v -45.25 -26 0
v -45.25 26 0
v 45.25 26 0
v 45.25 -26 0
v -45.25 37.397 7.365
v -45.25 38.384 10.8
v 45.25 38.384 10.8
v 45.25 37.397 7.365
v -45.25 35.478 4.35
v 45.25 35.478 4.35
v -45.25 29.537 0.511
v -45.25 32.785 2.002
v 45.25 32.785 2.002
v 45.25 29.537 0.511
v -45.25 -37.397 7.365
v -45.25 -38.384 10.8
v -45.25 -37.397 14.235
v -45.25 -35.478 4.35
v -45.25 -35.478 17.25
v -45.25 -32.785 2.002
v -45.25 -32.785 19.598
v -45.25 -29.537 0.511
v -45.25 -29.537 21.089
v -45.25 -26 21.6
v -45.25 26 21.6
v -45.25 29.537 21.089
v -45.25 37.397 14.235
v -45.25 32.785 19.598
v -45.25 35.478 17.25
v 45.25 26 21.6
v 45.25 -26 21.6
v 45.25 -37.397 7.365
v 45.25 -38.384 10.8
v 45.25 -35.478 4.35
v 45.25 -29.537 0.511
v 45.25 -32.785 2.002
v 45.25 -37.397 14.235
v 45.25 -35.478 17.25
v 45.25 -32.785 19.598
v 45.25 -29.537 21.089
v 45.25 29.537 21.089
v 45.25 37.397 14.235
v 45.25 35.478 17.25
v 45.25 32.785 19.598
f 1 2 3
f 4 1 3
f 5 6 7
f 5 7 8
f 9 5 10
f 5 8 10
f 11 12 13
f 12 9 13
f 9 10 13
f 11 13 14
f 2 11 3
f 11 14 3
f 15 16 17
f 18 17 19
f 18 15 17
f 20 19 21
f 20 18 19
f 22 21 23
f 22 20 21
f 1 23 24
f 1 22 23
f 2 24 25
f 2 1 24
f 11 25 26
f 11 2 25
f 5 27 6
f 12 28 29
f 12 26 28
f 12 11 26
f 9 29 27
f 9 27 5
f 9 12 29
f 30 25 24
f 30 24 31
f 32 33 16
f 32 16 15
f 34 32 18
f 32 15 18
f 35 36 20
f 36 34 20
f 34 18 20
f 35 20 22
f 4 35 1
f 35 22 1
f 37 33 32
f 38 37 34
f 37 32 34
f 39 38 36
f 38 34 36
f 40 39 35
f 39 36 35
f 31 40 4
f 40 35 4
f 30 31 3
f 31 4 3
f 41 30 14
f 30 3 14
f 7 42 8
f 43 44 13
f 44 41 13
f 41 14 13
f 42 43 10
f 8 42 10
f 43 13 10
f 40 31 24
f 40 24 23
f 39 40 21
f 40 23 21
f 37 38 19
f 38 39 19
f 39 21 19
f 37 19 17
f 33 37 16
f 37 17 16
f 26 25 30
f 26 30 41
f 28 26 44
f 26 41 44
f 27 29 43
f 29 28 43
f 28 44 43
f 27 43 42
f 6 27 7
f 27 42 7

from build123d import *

# Parameters (mm, degrees)
SKETCH_1_W      = 90.5
SKETCH_1_H      = 77
EXTRUDE_1_DEPTH = 21.6
FILLET_1_R      = 12.5


with BuildPart() as part:
    # 草圖1 → 填料-伸長1 (new body)
    with BuildSketch(Plane.XY):
        Rectangle(SKETCH_1_W, SKETCH_1_H)
    extrude(amount=EXTRUDE_1_DEPTH)

    # 圓角1
    # the kernel refuses this fillet: 12.5 mm, written as the material it takes off along each edge
    with BuildSketch(Plane(origin=(-76.5, -38.5, 0), x_dir=(0, 0, 1), z_dir=(1, 0, 0)), Plane(origin=(76.5, 38.5, 0), x_dir=(0, 0, 1), z_dir=(-1, 0, 0))) as fillet_1_piece_1:
        with BuildLine():
            CenterArc((FILLET_1_R, -FILLET_1_R), FILLET_1_R, 90, 90)
            Line((0, -FILLET_1_R), (0, 0))
            Line((0, 0), (FILLET_1_R, 0))
        make_face()
    extrude(amount=153, mode=Mode.SUBTRACT)
    with BuildSketch(Plane(origin=(-76.5, -38.5, 21.6), x_dir=(0, 0, -1), z_dir=(1, 0, 0)), Plane(origin=(76.5, 38.5, 21.6), x_dir=(0, 0, -1), z_dir=(-1, 0, 0))) as fillet_1_piece_2:
        with BuildLine():
            CenterArc((FILLET_1_R, FILLET_1_R), FILLET_1_R, 180, 90)
            Line((0, FILLET_1_R), (0, 0))
            Line((0, 0), (FILLET_1_R, 0))
        make_face()
    extrude(amount=153, mode=Mode.SUBTRACT)


solid = part.part
